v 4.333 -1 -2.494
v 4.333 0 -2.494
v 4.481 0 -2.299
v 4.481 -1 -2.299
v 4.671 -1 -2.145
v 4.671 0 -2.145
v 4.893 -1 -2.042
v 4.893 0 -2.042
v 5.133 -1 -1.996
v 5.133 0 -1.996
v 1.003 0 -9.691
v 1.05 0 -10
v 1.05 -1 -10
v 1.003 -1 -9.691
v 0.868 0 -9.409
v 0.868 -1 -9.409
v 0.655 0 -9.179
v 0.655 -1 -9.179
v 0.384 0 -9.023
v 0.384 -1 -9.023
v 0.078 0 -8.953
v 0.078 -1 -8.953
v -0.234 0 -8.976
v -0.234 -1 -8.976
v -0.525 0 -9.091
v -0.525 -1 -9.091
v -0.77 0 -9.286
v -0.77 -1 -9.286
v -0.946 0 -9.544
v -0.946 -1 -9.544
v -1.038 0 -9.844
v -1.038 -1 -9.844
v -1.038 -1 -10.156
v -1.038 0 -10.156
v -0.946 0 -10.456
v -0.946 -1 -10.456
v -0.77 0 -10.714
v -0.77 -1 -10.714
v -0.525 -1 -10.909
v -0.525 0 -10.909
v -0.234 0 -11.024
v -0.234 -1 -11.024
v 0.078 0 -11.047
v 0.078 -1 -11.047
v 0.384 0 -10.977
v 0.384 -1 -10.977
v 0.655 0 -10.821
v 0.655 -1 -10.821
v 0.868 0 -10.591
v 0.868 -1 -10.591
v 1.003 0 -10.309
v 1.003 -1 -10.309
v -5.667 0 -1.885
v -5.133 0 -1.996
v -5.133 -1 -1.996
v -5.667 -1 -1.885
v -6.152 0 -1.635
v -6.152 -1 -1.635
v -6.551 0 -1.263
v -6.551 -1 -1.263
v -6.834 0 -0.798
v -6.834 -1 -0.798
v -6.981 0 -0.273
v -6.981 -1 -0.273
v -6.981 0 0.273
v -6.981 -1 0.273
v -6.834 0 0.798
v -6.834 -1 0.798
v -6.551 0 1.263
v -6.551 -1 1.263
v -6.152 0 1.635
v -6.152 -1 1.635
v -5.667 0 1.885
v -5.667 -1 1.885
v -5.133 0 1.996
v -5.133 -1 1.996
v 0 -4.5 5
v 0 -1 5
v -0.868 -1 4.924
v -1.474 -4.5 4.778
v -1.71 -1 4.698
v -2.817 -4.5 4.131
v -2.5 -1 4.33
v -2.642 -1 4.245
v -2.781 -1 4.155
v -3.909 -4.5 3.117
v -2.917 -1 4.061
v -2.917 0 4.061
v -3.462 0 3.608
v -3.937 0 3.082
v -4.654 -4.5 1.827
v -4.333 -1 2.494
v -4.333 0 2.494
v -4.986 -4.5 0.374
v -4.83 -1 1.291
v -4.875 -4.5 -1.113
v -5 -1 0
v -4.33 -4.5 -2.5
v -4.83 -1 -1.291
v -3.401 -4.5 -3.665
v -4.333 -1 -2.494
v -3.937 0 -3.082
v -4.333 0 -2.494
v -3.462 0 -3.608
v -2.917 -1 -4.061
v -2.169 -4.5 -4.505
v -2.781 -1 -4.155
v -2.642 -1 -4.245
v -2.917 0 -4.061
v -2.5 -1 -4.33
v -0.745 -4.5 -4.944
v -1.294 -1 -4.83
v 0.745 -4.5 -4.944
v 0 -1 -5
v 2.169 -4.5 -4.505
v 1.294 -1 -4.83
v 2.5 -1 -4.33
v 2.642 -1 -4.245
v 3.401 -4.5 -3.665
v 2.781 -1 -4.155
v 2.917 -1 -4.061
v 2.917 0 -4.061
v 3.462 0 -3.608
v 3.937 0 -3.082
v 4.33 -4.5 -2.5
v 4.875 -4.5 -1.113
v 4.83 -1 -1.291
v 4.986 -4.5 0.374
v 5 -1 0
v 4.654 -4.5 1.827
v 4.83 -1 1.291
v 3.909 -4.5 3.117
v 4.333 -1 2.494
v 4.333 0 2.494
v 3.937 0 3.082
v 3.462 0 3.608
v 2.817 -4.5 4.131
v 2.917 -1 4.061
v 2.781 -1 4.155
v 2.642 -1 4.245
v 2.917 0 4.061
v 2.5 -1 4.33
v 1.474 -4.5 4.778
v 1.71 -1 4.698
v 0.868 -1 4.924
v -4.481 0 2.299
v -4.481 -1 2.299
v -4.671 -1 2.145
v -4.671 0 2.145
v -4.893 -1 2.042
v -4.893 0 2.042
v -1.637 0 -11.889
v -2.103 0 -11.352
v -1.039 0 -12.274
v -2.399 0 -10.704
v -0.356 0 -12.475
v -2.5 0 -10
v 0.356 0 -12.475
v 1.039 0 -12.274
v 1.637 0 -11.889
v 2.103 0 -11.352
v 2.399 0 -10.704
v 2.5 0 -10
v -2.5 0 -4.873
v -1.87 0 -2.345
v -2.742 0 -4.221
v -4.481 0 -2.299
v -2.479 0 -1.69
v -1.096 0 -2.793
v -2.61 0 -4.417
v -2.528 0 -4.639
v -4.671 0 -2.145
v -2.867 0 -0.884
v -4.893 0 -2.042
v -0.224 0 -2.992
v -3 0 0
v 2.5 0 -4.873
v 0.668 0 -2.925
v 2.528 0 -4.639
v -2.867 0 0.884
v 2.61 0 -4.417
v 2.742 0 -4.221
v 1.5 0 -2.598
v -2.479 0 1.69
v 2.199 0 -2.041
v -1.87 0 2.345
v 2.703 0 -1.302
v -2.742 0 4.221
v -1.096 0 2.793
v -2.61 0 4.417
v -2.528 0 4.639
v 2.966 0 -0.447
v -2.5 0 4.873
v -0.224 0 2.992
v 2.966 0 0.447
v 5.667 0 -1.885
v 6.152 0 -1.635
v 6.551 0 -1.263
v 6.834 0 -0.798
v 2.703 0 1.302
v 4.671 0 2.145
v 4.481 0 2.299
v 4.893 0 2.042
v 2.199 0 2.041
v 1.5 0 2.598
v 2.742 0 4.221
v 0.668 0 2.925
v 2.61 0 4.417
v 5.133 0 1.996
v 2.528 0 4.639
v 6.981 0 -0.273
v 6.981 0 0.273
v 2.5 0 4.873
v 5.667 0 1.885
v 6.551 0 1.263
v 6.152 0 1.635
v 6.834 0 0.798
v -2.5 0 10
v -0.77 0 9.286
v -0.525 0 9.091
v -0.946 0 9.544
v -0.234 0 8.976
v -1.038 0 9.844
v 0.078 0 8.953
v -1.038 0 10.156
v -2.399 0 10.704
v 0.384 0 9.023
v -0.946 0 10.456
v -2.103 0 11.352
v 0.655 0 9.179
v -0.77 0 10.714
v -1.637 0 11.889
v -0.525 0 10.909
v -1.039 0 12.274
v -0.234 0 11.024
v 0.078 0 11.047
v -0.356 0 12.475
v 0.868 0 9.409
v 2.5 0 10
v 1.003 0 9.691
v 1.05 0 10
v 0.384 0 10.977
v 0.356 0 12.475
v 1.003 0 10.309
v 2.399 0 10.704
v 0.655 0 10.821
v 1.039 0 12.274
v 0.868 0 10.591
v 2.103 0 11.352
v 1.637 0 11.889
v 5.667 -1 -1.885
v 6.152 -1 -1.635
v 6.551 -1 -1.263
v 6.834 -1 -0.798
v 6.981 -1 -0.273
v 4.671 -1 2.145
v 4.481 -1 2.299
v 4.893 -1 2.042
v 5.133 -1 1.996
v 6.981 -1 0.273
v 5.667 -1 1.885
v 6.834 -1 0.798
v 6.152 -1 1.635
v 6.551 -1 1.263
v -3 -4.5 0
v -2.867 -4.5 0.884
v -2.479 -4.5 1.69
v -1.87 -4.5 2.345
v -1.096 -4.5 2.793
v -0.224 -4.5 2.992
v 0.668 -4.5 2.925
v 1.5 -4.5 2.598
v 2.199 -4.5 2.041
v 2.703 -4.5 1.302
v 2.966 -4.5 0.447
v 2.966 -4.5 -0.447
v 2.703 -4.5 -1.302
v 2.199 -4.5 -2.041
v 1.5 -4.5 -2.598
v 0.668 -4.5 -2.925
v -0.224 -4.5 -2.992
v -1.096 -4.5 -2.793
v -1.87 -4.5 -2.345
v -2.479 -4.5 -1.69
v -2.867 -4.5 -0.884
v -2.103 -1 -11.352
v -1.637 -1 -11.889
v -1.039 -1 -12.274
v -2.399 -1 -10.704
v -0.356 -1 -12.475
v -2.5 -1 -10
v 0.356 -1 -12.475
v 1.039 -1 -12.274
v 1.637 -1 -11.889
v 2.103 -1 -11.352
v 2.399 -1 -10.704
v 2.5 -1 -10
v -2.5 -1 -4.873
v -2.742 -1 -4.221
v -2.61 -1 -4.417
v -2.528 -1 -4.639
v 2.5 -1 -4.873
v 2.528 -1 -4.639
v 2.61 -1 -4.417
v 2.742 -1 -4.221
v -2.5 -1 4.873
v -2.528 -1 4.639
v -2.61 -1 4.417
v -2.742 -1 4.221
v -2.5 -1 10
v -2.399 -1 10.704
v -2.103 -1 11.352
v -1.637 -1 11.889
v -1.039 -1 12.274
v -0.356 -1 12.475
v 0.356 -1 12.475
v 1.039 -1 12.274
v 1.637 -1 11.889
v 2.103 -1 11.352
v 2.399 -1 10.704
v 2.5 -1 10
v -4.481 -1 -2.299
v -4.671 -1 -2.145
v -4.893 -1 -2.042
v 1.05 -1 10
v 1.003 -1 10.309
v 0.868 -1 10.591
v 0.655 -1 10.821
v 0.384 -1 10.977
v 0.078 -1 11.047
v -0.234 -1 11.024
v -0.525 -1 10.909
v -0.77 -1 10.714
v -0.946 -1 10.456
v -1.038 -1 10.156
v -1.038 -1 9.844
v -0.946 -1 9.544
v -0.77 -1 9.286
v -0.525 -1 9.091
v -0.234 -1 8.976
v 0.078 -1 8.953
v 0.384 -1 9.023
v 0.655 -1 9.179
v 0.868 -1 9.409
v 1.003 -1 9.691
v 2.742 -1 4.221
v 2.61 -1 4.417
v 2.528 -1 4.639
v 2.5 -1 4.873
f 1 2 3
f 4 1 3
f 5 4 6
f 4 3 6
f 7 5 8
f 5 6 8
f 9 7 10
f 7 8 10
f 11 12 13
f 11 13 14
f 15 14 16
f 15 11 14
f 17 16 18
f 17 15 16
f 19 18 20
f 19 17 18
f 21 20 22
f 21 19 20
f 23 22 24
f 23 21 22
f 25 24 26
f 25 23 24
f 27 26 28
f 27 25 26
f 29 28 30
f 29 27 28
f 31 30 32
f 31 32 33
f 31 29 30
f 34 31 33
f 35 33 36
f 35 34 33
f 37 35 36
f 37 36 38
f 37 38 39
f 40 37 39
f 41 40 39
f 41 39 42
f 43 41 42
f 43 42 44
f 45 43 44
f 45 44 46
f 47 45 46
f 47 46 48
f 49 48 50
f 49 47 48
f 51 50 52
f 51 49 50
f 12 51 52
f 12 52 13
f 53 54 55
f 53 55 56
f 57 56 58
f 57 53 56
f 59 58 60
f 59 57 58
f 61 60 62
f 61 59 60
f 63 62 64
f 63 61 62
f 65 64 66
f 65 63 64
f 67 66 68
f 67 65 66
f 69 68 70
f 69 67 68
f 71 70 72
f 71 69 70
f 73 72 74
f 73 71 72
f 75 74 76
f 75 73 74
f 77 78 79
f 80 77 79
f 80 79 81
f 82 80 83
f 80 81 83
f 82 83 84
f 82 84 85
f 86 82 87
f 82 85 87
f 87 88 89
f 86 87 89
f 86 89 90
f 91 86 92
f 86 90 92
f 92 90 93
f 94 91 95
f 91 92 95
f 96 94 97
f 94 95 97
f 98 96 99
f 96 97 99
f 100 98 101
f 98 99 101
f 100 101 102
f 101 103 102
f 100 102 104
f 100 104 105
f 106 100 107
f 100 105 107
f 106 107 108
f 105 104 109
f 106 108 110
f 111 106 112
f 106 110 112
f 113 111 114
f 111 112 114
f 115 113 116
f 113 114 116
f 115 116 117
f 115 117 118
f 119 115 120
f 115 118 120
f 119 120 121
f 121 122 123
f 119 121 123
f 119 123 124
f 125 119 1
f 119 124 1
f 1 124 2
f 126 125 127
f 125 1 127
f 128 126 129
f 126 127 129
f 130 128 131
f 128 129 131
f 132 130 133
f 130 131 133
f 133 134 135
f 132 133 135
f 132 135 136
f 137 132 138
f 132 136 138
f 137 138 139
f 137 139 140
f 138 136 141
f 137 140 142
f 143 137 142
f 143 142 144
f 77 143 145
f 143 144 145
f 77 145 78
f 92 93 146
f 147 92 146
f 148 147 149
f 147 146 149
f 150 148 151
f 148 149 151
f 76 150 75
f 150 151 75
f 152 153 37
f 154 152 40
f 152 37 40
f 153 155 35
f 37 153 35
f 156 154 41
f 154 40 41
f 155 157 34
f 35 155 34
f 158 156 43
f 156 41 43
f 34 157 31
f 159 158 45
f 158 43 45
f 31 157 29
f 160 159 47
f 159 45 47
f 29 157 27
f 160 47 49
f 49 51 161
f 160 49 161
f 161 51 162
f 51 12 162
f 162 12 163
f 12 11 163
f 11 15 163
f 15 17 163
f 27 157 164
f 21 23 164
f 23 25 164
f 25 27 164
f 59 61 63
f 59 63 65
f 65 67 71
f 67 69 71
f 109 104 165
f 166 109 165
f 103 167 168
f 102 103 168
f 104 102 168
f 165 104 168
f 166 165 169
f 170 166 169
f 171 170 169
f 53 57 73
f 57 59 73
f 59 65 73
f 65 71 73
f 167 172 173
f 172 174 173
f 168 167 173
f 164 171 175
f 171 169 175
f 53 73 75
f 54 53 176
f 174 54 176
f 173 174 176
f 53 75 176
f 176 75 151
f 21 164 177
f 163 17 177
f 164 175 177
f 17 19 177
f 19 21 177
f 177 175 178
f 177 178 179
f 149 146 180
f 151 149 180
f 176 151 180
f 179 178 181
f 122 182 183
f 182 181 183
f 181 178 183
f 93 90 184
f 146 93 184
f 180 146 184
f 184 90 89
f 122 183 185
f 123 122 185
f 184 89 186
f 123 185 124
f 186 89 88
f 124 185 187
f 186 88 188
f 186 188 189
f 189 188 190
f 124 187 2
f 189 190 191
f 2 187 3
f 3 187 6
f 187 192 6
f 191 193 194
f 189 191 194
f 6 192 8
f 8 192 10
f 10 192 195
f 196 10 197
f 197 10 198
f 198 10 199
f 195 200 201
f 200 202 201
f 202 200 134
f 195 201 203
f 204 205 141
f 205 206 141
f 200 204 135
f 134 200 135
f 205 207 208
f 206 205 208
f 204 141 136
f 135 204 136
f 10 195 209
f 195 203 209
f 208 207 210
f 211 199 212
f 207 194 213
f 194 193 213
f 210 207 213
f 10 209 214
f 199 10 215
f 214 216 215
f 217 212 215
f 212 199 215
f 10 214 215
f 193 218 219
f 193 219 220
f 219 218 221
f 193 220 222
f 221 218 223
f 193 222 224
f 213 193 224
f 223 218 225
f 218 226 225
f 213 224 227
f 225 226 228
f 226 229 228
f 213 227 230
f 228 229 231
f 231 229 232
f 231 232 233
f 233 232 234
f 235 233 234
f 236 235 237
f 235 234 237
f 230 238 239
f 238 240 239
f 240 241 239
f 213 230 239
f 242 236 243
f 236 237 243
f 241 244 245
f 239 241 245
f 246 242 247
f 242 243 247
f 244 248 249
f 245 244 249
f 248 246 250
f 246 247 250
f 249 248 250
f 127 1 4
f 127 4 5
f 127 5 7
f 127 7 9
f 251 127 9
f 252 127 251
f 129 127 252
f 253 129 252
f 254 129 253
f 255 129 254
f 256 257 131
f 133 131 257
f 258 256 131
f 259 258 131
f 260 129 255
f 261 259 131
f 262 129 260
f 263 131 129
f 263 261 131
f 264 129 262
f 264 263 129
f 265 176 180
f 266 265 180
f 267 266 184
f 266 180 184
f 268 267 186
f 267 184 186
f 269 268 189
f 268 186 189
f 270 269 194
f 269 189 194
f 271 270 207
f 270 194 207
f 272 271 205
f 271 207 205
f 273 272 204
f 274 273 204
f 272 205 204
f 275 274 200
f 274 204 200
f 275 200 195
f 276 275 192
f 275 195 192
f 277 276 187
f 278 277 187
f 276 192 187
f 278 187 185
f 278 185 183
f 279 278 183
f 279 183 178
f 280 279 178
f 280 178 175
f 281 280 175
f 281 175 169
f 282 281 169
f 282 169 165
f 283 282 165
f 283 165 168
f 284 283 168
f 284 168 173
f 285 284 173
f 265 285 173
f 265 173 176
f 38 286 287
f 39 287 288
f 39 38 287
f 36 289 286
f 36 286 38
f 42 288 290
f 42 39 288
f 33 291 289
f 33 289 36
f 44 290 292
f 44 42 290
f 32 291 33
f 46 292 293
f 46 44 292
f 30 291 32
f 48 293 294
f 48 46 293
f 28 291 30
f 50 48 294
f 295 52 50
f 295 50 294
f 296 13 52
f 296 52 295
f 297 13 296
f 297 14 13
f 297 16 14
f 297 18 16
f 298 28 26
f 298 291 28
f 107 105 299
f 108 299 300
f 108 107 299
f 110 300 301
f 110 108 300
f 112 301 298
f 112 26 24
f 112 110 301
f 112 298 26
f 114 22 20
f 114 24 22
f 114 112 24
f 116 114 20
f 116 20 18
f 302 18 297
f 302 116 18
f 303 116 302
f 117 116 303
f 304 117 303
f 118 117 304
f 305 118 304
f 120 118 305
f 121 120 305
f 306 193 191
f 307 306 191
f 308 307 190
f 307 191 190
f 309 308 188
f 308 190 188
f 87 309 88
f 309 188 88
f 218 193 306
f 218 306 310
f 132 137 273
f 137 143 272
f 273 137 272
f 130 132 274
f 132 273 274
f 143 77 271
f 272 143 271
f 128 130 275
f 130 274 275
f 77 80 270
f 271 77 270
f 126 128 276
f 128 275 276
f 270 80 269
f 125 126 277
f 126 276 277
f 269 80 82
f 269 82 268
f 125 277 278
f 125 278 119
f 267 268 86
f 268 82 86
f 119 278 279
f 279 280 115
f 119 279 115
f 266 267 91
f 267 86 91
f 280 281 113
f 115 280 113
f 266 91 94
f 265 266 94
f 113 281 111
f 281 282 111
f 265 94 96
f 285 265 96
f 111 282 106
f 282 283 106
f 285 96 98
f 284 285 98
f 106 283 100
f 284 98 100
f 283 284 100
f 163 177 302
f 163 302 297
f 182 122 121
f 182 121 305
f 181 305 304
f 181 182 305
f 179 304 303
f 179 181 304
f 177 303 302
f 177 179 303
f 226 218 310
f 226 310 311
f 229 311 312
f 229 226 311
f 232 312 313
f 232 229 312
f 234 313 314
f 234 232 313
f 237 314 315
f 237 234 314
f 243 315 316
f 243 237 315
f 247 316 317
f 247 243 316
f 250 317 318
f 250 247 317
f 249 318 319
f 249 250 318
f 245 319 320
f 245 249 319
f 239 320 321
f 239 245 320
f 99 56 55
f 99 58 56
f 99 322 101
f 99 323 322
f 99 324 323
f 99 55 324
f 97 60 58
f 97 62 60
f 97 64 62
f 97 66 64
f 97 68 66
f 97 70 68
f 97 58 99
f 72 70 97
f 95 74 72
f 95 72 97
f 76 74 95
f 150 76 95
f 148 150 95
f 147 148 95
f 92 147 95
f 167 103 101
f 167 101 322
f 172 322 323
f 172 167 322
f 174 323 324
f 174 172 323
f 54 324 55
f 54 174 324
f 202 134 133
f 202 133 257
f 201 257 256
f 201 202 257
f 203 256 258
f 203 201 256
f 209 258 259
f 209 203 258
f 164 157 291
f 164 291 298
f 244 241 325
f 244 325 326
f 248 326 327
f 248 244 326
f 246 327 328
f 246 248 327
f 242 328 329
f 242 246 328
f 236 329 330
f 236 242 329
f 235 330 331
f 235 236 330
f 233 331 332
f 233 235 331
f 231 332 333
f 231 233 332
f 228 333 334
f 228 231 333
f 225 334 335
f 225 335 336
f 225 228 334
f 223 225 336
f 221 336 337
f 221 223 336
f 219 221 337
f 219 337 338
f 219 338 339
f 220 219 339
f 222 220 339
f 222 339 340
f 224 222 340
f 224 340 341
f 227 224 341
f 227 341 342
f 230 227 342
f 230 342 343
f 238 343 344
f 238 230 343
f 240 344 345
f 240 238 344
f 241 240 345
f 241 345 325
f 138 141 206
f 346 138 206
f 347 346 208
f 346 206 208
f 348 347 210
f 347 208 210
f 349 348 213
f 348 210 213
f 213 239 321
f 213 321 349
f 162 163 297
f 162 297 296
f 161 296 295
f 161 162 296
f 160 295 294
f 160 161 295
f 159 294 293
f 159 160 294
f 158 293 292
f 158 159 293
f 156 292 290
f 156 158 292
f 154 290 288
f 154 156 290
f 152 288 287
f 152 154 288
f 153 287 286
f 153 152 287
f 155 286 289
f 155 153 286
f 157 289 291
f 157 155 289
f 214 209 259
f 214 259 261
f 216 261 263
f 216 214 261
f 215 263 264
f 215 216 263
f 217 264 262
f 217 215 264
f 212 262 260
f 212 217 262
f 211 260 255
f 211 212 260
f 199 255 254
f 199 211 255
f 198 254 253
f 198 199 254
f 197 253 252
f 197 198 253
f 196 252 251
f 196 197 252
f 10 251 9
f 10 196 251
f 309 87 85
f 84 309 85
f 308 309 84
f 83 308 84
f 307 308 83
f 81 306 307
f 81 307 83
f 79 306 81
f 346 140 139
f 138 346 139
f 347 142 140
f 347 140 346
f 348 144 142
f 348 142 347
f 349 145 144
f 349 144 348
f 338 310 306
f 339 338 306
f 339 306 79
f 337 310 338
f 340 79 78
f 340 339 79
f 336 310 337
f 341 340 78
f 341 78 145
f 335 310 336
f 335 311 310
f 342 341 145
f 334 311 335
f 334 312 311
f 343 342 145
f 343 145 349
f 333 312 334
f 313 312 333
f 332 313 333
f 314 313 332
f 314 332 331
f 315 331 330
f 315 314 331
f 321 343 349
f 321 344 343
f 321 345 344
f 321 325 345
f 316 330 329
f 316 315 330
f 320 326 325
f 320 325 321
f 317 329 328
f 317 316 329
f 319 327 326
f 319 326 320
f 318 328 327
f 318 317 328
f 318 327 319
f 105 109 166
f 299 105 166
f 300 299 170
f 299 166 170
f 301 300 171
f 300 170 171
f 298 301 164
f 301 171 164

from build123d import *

# Parameters (mm, degrees)
F0_W        = 4.5
F0_H        = 5
F3_DEPTH    = 1
F4_W        = 10
F4_H        = 4
F5_DEPTH    = 1
F6_T1_DEPTH = 1
F7_R        = 3
F8_DEPTH    = 4.501


# Not quite as in the source:
# - a fillet or chamfer that OpenCascade refuses, or shapes differently, is made with other operations: its cross-section is extruded or revolved along the edge and cut away or added


with BuildPart() as f1:
    # F0 (on Right) → F1 (revolve)
    with BuildSketch(Plane.YZ):
        with Locations((-2.25, 2.5)):
            Rectangle(F0_W, F0_H)
    revolve(axis=Axis((0, -2.25, 0), (0, -1, 0)))

    # F2 (on face) → F3 (join)
    with BuildSketch(Plane(origin=(0, 0, 0), x_dir=(-1, 0, 0), z_dir=(0, 1, 0))):
        with BuildLine():
            ThreePointArc((-2.5, -10), (0, -12.5), (2.5, -10))
            Line((2.5, -10), (1.05, -10))
            ThreePointArc((1.05, -10), (0, -11.05), (-1.05, -10))
            Line((-1.05, -10), (-2.5, -10))
        make_face()
        with BuildLine():
            Line((1.05, -10), (2.5, -10))
            Line((2.5, -10), (2.5, 10))
            Line((2.5, 10), (1.05, 10))
            ThreePointArc((1.05, 10), (0, 8.95), (-1.05, 10))
            Line((-1.05, 10), (-2.5, 10))
            Line((-2.5, 10), (-2.5, -10))
            Line((-2.5, -10), (-1.05, -10))
            ThreePointArc((-1.05, -10), (0, -8.95), (1.05, -10))
        make_face()
        with BuildLine():
            Line((1.05, 10), (2.5, 10))
            ThreePointArc((2.5, 10), (0, 12.5), (-2.5, 10))
            Line((-2.5, 10), (-1.05, 10))
            ThreePointArc((-1.05, 10), (0, 11.05), (1.05, 10))
        make_face()
    extrude(amount=-F3_DEPTH)

    # F4 (on face) → F5 (join)
    with BuildSketch(Plane(origin=(0, 0, 0), x_dir=(-1, 0, 0), z_dir=(0, 1, 0))):
        Rectangle(F4_W, F4_H)
        with BuildLine():
            Line((5, 2), (5, -2))
            ThreePointArc((5, -2), (7, 0), (5, 2))
        make_face()
        with BuildLine():
            ThreePointArc((-5, 2), (-7, 0), (-5, -2))
            Line((-5, -2), (-5, 2))
        make_face()
    extrude(amount=-F5_DEPTH)

    # F6: fillet of radius 1 on 8 edges, made by hand

    # F6_s2 → F6_t1 (join)
    with BuildSketch(Plane.XZ):
        with BuildLine():
            ThreePointArc((-2.5, 4.8733971724), (-2.610243479, 4.4169617078), (-2.9166666667, 4.0611643103))
            ThreePointArc((-2.9166666667, 4.0611643103), (-2.7116700904, 4.2008148401), (-2.5, 4.3301270189))
            Line((-2.5, 4.3301270189), (-2.5, 4.8733971724))
        make_face()
        with BuildLine():
            ThreePointArc((-2.9166666667, -4.0611643103), (-2.610243479, -4.4169617078), (-2.5, -4.8733971724))
            Line((-2.5, -4.8733971724), (-2.5, -4.3301270189))
            ThreePointArc((-2.5, -4.3301270189), (-2.7116700904, -4.2008148401), (-2.9166666667, -4.0611643103))
        make_face()
        with BuildLine():
            ThreePointArc((4.3333333333, 2.4944382578), (4.6708497378, 2.144797772), (5.1333333333, 1.9955506063))
            Line((5.1333333333, 1.9955506063), (5.1266666667, 1.895773076))
            ThreePointArc((5.1266666667, 1.895773076), (5, 1.9), (4.582575695, 1.9))
            Line((4.582575695, 1.9), (4.4909241811, 1.96))
            ThreePointArc((4.4909241811, 1.96), (4.3755080286, 2.2056585166), (4.2466666667, 2.4445494927))
            Line((4.2466666667, 2.4445494927), (4.3333333333, 2.4944382578))
        make_face()
        with BuildLine():
            ThreePointArc((-4.3333333333, 2.4944382578), (-4.6708497378, 2.144797772), (-5.1333333333, 1.9955506063))
            Line((-5.1333333333, 1.9955506063), (-5.1266666667, 1.895773076))
            ThreePointArc((-5.1266666667, 1.895773076), (-5, 1.9), (-4.582575695, 1.9))
            Line((-4.582575695, 1.9), (-4.4909241811, 1.96))
            ThreePointArc((-4.4909241811, 1.96), (-4.3755080286, 2.2056585166), (-4.2466666667, 2.4445494927))
            Line((-4.2466666667, 2.4445494927), (-4.3333333333, 2.4944382578))
        make_face()
        with BuildLine():
            ThreePointArc((4.3333333333, -2.4944382578), (4.6708497378, -2.144797772), (5.1333333333, -1.9955506063))
            Line((5.1333333333, -1.9955506063), (5.1266666667, -1.895773076))
            ThreePointArc((5.1266666667, -1.895773076), (5, -1.9), (4.582575695, -1.9))
            Line((4.582575695, -1.9), (4.4909241811, -1.96))
            ThreePointArc((4.4909241811, -1.96), (4.3755080286, -2.2056585166), (4.2466666667, -2.4445494927))
            Line((4.2466666667, -2.4445494927), (4.3333333333, -2.4944382578))
        make_face()
        with BuildLine():
            ThreePointArc((-4.3333333333, -2.4944382578), (-4.6708497378, -2.144797772), (-5.1333333333, -1.9955506063))
            Line((-5.1333333333, -1.9955506063), (-5.1266666667, -1.895773076))
            ThreePointArc((-5.1266666667, -1.895773076), (-5, -1.9), (-4.582575695, -1.9))
            Line((-4.582575695, -1.9), (-4.4909241811, -1.96))
            ThreePointArc((-4.4909241811, -1.96), (-4.3755080286, -2.2056585166), (-4.2466666667, -2.4445494927))
            Line((-4.2466666667, -2.4445494927), (-4.3333333333, -2.4944382578))
        make_face()
        with BuildLine():
            ThreePointArc((2.9166666667, 4.0611643103), (2.610243479, 4.4169617078), (2.5, 4.8733971724))
            Line((2.5, 4.8733971724), (2.5, 4.3301270189))
            ThreePointArc((2.5, 4.3301270189), (2.7116700904, 4.2008148401), (2.9166666667, 4.0611643103))
        make_face()
        with BuildLine():
            ThreePointArc((2.9166666667, -4.0611643103), (2.610243479, -4.4169617078), (2.5, -4.8733971724))
            Line((2.5, -4.8733971724), (2.5, -4.3301270189))
            ThreePointArc((2.5, -4.3301270189), (2.7116700904, -4.2008148401), (2.9166666667, -4.0611643103))
        make_face()
    extrude(amount=F6_T1_DEPTH)

    # F7 (on face) → F8 (cut, through all)
    with BuildSketch(Plane(origin=(0, 0, 0), x_dir=(-1, 0, 0), z_dir=(0, 1, 0))):
        Circle(F7_R)
    extrude(amount=-F8_DEPTH, mode=Mode.SUBTRACT)


solid = f1.part
